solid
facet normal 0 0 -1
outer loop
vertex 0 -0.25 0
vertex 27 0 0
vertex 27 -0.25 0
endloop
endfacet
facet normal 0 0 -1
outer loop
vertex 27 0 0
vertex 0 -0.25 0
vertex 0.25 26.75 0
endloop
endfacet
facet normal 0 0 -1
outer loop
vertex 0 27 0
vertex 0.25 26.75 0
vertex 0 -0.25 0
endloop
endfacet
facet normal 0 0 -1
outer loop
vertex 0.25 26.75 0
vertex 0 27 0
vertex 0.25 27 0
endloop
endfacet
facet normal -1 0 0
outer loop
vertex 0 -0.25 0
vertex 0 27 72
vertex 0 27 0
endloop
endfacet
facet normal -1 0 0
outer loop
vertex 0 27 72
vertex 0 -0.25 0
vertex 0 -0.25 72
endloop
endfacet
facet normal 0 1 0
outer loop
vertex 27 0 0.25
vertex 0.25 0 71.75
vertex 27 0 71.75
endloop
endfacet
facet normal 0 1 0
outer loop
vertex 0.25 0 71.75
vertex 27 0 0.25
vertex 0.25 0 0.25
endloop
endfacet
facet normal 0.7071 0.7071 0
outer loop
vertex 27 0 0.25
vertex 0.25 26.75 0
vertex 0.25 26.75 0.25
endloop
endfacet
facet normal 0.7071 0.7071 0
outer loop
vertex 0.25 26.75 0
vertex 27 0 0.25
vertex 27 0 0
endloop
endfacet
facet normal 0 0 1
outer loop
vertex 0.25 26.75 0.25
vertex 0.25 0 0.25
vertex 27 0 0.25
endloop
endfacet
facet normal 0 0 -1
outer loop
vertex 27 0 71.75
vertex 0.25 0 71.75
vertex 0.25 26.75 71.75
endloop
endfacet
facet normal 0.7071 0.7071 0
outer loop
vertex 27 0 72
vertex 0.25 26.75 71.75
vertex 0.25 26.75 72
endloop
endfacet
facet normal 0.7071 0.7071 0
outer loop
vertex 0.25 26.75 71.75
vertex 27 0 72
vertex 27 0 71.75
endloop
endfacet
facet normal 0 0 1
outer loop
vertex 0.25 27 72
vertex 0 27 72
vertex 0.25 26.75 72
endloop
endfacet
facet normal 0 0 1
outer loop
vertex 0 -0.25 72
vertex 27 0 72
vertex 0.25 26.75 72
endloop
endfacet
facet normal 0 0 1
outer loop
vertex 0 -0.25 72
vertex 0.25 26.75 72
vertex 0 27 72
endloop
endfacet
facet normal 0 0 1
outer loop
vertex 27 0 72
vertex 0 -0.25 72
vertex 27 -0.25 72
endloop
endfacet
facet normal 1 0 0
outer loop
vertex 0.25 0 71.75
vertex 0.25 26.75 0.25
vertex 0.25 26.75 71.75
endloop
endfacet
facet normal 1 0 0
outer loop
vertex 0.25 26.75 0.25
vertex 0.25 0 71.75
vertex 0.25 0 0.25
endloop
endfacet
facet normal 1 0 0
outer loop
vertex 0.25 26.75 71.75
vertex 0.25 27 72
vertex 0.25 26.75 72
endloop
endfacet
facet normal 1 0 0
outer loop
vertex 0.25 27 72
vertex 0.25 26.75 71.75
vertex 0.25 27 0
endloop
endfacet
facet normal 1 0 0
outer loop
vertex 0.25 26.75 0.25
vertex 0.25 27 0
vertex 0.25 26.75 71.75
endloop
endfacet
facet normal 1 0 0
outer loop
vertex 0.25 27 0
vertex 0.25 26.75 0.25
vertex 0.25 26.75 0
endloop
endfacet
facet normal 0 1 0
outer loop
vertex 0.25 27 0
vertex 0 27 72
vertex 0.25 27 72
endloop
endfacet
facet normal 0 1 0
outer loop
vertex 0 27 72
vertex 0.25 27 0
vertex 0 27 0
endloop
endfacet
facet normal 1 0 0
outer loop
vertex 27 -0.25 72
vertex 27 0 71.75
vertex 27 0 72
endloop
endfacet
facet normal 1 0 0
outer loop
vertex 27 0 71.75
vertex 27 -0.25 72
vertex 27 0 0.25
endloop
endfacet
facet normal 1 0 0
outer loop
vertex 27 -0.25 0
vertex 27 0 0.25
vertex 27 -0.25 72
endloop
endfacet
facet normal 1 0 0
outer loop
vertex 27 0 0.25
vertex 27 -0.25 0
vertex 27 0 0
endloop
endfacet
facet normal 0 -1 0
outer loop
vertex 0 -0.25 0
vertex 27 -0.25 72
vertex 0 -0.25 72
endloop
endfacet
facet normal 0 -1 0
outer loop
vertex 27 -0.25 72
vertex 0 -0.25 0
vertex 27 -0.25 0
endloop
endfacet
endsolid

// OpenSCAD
thick = 1/4;
width = 72;
side = 27;

module triangle_plate(points, thickness) {
	o = [0,0,thickness];
	polyhedron(points=[points[0],points[1],points[2],points[0]+o,points[1]+o,points[2]+o ], 
   	triangles= [ [0,1,2], [1, 4, 5, 2], [3,5,4], [0, 3, 4, 1], [0,2,5,3]]);
}

// left
triangle_plate([[0,0,0],[side,0,0],[0,side,0]], thick);

// right
translate([0,0,width-thick]) {
	triangle_plate([[0,0,0],[side,0,0],[0,side,0]], thick);
}

// back
translate([0,0,0]) {
	cube(size=[thick, side, width]);
}

// bottom
translate([0,-thick,0]) {
	cube(size=[side, thick, width]);
}
